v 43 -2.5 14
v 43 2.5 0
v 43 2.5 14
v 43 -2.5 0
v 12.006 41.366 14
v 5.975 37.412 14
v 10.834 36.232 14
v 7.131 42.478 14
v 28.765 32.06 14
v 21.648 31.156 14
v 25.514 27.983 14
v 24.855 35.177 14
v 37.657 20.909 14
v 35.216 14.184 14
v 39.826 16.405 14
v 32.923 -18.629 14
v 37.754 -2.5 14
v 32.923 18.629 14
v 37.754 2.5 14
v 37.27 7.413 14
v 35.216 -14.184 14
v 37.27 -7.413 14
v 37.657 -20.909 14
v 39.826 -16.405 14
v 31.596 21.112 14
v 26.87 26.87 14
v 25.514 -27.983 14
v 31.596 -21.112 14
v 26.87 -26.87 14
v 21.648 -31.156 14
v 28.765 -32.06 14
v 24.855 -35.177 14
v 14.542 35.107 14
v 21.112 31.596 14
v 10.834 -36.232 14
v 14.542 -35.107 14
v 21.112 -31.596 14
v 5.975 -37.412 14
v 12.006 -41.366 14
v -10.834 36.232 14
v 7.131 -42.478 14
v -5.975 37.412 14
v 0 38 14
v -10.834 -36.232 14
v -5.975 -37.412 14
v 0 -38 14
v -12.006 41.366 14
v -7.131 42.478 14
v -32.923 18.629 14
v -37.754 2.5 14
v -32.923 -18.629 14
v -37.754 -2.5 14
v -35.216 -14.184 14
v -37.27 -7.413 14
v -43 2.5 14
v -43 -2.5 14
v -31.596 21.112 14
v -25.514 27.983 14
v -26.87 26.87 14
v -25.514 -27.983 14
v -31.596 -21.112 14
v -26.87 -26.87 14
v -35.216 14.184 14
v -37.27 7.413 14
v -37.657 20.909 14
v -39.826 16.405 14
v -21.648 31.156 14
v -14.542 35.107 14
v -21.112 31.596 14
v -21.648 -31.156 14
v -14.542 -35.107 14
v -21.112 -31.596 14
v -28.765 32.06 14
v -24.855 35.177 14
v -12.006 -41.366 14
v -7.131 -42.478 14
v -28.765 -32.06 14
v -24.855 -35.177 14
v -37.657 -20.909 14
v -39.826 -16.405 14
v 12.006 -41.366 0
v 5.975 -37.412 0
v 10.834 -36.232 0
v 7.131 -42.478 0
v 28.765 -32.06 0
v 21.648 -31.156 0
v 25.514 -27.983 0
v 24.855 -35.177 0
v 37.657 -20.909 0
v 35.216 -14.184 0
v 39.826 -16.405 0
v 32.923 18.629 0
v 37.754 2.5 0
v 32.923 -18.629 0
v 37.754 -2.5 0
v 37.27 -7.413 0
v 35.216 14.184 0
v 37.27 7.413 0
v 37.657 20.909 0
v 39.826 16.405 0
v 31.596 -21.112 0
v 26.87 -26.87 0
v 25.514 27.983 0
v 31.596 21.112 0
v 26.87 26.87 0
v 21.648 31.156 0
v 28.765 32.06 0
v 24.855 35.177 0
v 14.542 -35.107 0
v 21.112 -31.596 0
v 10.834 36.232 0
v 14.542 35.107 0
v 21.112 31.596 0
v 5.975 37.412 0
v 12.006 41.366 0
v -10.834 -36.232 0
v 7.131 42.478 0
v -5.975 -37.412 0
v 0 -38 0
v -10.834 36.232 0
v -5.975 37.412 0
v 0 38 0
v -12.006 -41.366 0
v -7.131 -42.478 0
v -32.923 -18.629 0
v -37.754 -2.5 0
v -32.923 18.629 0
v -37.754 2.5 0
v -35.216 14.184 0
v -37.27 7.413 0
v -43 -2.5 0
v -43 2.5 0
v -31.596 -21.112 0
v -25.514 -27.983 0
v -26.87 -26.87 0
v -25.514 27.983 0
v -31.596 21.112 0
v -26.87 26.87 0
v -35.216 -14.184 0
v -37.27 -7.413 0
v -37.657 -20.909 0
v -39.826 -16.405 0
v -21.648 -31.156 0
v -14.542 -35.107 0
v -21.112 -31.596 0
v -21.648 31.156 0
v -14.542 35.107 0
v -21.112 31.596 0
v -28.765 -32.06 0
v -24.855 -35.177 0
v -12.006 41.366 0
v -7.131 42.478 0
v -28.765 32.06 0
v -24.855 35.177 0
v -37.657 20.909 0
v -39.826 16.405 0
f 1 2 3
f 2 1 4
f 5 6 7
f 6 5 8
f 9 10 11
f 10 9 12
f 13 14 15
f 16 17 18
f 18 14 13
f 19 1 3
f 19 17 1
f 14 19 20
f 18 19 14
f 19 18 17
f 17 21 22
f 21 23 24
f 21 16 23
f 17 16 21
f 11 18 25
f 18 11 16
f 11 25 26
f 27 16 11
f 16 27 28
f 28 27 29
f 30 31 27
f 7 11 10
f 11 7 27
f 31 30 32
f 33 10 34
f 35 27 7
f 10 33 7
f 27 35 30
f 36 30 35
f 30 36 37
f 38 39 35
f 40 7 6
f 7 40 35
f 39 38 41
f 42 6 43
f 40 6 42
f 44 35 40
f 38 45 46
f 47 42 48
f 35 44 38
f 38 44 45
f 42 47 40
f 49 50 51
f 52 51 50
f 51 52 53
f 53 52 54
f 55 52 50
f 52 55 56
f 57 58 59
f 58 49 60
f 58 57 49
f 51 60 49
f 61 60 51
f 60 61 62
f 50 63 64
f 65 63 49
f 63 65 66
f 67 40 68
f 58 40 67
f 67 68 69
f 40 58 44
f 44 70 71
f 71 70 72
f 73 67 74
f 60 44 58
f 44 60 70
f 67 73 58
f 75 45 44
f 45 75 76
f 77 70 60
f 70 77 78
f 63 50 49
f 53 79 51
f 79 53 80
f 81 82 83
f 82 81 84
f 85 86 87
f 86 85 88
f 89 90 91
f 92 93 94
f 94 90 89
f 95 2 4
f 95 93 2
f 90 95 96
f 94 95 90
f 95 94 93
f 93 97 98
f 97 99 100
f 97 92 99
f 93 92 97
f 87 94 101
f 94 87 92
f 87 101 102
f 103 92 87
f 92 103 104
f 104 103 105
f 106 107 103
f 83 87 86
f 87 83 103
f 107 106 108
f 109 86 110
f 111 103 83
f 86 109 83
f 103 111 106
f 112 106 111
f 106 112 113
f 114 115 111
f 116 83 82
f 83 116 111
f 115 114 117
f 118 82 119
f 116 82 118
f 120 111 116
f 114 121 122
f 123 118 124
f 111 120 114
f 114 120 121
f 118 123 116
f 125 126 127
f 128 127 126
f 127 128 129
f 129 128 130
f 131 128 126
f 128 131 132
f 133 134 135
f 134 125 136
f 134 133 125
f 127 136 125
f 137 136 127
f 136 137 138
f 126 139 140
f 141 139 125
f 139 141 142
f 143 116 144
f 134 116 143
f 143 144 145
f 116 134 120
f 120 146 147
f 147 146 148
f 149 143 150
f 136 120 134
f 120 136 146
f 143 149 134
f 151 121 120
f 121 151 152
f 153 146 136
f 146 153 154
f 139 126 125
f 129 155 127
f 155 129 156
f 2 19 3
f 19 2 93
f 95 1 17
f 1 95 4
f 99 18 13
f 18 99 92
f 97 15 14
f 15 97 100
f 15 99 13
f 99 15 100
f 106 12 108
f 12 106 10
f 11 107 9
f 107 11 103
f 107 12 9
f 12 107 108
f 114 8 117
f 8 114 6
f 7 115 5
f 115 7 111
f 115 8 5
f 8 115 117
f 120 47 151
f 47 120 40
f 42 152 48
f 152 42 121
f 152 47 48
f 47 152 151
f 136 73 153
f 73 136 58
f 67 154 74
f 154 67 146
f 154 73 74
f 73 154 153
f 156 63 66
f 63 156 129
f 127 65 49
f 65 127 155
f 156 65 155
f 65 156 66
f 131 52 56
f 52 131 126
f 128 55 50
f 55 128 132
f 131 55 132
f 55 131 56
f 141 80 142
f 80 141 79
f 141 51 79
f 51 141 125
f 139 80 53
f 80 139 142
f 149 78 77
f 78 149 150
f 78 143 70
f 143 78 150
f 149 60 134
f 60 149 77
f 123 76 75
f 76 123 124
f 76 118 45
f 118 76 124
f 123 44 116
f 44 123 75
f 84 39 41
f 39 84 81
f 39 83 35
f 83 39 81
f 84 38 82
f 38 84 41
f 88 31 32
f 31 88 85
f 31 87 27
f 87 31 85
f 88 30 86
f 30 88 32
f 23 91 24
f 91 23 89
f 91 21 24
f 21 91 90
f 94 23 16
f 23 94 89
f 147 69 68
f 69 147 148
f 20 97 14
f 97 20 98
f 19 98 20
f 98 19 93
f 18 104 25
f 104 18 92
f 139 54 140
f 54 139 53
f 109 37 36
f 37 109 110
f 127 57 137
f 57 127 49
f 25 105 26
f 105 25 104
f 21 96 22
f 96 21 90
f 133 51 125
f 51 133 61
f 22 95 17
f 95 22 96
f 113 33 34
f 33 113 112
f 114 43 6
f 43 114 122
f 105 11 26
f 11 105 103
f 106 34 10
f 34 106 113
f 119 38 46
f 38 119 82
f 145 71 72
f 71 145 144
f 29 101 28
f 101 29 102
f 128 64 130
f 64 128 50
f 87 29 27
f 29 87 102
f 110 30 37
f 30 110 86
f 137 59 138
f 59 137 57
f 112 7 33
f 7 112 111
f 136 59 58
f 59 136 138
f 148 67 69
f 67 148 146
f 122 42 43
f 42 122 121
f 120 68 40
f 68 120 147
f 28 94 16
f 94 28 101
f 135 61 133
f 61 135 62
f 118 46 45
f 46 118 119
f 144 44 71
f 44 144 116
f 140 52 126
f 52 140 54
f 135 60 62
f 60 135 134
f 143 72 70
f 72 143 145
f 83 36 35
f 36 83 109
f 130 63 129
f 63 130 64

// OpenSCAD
$fn = 32;

// ----------------------------------------------------------------------
// Spur blank: plain gear blank
// ----------------------------------------------------------------------

// --- parameters (mm) ---
disc_r = 38;              // blank root radius
disc_t = 14;              // blank thickness
n_teeth = 14;             // stub tooth count
tooth_w = 5;              // tooth width at the root
tooth_h = 5;              // tooth height above the root

out_r = disc_r + tooth_h;  // tip radius
bbox_x = 86.0;  // measured width over the teeth
bbox_y = 84.96;  // measured depth over the teeth

union() {
  cylinder(r = disc_r, h = disc_t);
  for (i = [0 : n_teeth - 1])
    rotate([0, 0, i * 360 / n_teeth])
      translate([disc_r - 1, -tooth_w / 2, 0])
        cube([tooth_h + 1, tooth_w, disc_t]);
}
